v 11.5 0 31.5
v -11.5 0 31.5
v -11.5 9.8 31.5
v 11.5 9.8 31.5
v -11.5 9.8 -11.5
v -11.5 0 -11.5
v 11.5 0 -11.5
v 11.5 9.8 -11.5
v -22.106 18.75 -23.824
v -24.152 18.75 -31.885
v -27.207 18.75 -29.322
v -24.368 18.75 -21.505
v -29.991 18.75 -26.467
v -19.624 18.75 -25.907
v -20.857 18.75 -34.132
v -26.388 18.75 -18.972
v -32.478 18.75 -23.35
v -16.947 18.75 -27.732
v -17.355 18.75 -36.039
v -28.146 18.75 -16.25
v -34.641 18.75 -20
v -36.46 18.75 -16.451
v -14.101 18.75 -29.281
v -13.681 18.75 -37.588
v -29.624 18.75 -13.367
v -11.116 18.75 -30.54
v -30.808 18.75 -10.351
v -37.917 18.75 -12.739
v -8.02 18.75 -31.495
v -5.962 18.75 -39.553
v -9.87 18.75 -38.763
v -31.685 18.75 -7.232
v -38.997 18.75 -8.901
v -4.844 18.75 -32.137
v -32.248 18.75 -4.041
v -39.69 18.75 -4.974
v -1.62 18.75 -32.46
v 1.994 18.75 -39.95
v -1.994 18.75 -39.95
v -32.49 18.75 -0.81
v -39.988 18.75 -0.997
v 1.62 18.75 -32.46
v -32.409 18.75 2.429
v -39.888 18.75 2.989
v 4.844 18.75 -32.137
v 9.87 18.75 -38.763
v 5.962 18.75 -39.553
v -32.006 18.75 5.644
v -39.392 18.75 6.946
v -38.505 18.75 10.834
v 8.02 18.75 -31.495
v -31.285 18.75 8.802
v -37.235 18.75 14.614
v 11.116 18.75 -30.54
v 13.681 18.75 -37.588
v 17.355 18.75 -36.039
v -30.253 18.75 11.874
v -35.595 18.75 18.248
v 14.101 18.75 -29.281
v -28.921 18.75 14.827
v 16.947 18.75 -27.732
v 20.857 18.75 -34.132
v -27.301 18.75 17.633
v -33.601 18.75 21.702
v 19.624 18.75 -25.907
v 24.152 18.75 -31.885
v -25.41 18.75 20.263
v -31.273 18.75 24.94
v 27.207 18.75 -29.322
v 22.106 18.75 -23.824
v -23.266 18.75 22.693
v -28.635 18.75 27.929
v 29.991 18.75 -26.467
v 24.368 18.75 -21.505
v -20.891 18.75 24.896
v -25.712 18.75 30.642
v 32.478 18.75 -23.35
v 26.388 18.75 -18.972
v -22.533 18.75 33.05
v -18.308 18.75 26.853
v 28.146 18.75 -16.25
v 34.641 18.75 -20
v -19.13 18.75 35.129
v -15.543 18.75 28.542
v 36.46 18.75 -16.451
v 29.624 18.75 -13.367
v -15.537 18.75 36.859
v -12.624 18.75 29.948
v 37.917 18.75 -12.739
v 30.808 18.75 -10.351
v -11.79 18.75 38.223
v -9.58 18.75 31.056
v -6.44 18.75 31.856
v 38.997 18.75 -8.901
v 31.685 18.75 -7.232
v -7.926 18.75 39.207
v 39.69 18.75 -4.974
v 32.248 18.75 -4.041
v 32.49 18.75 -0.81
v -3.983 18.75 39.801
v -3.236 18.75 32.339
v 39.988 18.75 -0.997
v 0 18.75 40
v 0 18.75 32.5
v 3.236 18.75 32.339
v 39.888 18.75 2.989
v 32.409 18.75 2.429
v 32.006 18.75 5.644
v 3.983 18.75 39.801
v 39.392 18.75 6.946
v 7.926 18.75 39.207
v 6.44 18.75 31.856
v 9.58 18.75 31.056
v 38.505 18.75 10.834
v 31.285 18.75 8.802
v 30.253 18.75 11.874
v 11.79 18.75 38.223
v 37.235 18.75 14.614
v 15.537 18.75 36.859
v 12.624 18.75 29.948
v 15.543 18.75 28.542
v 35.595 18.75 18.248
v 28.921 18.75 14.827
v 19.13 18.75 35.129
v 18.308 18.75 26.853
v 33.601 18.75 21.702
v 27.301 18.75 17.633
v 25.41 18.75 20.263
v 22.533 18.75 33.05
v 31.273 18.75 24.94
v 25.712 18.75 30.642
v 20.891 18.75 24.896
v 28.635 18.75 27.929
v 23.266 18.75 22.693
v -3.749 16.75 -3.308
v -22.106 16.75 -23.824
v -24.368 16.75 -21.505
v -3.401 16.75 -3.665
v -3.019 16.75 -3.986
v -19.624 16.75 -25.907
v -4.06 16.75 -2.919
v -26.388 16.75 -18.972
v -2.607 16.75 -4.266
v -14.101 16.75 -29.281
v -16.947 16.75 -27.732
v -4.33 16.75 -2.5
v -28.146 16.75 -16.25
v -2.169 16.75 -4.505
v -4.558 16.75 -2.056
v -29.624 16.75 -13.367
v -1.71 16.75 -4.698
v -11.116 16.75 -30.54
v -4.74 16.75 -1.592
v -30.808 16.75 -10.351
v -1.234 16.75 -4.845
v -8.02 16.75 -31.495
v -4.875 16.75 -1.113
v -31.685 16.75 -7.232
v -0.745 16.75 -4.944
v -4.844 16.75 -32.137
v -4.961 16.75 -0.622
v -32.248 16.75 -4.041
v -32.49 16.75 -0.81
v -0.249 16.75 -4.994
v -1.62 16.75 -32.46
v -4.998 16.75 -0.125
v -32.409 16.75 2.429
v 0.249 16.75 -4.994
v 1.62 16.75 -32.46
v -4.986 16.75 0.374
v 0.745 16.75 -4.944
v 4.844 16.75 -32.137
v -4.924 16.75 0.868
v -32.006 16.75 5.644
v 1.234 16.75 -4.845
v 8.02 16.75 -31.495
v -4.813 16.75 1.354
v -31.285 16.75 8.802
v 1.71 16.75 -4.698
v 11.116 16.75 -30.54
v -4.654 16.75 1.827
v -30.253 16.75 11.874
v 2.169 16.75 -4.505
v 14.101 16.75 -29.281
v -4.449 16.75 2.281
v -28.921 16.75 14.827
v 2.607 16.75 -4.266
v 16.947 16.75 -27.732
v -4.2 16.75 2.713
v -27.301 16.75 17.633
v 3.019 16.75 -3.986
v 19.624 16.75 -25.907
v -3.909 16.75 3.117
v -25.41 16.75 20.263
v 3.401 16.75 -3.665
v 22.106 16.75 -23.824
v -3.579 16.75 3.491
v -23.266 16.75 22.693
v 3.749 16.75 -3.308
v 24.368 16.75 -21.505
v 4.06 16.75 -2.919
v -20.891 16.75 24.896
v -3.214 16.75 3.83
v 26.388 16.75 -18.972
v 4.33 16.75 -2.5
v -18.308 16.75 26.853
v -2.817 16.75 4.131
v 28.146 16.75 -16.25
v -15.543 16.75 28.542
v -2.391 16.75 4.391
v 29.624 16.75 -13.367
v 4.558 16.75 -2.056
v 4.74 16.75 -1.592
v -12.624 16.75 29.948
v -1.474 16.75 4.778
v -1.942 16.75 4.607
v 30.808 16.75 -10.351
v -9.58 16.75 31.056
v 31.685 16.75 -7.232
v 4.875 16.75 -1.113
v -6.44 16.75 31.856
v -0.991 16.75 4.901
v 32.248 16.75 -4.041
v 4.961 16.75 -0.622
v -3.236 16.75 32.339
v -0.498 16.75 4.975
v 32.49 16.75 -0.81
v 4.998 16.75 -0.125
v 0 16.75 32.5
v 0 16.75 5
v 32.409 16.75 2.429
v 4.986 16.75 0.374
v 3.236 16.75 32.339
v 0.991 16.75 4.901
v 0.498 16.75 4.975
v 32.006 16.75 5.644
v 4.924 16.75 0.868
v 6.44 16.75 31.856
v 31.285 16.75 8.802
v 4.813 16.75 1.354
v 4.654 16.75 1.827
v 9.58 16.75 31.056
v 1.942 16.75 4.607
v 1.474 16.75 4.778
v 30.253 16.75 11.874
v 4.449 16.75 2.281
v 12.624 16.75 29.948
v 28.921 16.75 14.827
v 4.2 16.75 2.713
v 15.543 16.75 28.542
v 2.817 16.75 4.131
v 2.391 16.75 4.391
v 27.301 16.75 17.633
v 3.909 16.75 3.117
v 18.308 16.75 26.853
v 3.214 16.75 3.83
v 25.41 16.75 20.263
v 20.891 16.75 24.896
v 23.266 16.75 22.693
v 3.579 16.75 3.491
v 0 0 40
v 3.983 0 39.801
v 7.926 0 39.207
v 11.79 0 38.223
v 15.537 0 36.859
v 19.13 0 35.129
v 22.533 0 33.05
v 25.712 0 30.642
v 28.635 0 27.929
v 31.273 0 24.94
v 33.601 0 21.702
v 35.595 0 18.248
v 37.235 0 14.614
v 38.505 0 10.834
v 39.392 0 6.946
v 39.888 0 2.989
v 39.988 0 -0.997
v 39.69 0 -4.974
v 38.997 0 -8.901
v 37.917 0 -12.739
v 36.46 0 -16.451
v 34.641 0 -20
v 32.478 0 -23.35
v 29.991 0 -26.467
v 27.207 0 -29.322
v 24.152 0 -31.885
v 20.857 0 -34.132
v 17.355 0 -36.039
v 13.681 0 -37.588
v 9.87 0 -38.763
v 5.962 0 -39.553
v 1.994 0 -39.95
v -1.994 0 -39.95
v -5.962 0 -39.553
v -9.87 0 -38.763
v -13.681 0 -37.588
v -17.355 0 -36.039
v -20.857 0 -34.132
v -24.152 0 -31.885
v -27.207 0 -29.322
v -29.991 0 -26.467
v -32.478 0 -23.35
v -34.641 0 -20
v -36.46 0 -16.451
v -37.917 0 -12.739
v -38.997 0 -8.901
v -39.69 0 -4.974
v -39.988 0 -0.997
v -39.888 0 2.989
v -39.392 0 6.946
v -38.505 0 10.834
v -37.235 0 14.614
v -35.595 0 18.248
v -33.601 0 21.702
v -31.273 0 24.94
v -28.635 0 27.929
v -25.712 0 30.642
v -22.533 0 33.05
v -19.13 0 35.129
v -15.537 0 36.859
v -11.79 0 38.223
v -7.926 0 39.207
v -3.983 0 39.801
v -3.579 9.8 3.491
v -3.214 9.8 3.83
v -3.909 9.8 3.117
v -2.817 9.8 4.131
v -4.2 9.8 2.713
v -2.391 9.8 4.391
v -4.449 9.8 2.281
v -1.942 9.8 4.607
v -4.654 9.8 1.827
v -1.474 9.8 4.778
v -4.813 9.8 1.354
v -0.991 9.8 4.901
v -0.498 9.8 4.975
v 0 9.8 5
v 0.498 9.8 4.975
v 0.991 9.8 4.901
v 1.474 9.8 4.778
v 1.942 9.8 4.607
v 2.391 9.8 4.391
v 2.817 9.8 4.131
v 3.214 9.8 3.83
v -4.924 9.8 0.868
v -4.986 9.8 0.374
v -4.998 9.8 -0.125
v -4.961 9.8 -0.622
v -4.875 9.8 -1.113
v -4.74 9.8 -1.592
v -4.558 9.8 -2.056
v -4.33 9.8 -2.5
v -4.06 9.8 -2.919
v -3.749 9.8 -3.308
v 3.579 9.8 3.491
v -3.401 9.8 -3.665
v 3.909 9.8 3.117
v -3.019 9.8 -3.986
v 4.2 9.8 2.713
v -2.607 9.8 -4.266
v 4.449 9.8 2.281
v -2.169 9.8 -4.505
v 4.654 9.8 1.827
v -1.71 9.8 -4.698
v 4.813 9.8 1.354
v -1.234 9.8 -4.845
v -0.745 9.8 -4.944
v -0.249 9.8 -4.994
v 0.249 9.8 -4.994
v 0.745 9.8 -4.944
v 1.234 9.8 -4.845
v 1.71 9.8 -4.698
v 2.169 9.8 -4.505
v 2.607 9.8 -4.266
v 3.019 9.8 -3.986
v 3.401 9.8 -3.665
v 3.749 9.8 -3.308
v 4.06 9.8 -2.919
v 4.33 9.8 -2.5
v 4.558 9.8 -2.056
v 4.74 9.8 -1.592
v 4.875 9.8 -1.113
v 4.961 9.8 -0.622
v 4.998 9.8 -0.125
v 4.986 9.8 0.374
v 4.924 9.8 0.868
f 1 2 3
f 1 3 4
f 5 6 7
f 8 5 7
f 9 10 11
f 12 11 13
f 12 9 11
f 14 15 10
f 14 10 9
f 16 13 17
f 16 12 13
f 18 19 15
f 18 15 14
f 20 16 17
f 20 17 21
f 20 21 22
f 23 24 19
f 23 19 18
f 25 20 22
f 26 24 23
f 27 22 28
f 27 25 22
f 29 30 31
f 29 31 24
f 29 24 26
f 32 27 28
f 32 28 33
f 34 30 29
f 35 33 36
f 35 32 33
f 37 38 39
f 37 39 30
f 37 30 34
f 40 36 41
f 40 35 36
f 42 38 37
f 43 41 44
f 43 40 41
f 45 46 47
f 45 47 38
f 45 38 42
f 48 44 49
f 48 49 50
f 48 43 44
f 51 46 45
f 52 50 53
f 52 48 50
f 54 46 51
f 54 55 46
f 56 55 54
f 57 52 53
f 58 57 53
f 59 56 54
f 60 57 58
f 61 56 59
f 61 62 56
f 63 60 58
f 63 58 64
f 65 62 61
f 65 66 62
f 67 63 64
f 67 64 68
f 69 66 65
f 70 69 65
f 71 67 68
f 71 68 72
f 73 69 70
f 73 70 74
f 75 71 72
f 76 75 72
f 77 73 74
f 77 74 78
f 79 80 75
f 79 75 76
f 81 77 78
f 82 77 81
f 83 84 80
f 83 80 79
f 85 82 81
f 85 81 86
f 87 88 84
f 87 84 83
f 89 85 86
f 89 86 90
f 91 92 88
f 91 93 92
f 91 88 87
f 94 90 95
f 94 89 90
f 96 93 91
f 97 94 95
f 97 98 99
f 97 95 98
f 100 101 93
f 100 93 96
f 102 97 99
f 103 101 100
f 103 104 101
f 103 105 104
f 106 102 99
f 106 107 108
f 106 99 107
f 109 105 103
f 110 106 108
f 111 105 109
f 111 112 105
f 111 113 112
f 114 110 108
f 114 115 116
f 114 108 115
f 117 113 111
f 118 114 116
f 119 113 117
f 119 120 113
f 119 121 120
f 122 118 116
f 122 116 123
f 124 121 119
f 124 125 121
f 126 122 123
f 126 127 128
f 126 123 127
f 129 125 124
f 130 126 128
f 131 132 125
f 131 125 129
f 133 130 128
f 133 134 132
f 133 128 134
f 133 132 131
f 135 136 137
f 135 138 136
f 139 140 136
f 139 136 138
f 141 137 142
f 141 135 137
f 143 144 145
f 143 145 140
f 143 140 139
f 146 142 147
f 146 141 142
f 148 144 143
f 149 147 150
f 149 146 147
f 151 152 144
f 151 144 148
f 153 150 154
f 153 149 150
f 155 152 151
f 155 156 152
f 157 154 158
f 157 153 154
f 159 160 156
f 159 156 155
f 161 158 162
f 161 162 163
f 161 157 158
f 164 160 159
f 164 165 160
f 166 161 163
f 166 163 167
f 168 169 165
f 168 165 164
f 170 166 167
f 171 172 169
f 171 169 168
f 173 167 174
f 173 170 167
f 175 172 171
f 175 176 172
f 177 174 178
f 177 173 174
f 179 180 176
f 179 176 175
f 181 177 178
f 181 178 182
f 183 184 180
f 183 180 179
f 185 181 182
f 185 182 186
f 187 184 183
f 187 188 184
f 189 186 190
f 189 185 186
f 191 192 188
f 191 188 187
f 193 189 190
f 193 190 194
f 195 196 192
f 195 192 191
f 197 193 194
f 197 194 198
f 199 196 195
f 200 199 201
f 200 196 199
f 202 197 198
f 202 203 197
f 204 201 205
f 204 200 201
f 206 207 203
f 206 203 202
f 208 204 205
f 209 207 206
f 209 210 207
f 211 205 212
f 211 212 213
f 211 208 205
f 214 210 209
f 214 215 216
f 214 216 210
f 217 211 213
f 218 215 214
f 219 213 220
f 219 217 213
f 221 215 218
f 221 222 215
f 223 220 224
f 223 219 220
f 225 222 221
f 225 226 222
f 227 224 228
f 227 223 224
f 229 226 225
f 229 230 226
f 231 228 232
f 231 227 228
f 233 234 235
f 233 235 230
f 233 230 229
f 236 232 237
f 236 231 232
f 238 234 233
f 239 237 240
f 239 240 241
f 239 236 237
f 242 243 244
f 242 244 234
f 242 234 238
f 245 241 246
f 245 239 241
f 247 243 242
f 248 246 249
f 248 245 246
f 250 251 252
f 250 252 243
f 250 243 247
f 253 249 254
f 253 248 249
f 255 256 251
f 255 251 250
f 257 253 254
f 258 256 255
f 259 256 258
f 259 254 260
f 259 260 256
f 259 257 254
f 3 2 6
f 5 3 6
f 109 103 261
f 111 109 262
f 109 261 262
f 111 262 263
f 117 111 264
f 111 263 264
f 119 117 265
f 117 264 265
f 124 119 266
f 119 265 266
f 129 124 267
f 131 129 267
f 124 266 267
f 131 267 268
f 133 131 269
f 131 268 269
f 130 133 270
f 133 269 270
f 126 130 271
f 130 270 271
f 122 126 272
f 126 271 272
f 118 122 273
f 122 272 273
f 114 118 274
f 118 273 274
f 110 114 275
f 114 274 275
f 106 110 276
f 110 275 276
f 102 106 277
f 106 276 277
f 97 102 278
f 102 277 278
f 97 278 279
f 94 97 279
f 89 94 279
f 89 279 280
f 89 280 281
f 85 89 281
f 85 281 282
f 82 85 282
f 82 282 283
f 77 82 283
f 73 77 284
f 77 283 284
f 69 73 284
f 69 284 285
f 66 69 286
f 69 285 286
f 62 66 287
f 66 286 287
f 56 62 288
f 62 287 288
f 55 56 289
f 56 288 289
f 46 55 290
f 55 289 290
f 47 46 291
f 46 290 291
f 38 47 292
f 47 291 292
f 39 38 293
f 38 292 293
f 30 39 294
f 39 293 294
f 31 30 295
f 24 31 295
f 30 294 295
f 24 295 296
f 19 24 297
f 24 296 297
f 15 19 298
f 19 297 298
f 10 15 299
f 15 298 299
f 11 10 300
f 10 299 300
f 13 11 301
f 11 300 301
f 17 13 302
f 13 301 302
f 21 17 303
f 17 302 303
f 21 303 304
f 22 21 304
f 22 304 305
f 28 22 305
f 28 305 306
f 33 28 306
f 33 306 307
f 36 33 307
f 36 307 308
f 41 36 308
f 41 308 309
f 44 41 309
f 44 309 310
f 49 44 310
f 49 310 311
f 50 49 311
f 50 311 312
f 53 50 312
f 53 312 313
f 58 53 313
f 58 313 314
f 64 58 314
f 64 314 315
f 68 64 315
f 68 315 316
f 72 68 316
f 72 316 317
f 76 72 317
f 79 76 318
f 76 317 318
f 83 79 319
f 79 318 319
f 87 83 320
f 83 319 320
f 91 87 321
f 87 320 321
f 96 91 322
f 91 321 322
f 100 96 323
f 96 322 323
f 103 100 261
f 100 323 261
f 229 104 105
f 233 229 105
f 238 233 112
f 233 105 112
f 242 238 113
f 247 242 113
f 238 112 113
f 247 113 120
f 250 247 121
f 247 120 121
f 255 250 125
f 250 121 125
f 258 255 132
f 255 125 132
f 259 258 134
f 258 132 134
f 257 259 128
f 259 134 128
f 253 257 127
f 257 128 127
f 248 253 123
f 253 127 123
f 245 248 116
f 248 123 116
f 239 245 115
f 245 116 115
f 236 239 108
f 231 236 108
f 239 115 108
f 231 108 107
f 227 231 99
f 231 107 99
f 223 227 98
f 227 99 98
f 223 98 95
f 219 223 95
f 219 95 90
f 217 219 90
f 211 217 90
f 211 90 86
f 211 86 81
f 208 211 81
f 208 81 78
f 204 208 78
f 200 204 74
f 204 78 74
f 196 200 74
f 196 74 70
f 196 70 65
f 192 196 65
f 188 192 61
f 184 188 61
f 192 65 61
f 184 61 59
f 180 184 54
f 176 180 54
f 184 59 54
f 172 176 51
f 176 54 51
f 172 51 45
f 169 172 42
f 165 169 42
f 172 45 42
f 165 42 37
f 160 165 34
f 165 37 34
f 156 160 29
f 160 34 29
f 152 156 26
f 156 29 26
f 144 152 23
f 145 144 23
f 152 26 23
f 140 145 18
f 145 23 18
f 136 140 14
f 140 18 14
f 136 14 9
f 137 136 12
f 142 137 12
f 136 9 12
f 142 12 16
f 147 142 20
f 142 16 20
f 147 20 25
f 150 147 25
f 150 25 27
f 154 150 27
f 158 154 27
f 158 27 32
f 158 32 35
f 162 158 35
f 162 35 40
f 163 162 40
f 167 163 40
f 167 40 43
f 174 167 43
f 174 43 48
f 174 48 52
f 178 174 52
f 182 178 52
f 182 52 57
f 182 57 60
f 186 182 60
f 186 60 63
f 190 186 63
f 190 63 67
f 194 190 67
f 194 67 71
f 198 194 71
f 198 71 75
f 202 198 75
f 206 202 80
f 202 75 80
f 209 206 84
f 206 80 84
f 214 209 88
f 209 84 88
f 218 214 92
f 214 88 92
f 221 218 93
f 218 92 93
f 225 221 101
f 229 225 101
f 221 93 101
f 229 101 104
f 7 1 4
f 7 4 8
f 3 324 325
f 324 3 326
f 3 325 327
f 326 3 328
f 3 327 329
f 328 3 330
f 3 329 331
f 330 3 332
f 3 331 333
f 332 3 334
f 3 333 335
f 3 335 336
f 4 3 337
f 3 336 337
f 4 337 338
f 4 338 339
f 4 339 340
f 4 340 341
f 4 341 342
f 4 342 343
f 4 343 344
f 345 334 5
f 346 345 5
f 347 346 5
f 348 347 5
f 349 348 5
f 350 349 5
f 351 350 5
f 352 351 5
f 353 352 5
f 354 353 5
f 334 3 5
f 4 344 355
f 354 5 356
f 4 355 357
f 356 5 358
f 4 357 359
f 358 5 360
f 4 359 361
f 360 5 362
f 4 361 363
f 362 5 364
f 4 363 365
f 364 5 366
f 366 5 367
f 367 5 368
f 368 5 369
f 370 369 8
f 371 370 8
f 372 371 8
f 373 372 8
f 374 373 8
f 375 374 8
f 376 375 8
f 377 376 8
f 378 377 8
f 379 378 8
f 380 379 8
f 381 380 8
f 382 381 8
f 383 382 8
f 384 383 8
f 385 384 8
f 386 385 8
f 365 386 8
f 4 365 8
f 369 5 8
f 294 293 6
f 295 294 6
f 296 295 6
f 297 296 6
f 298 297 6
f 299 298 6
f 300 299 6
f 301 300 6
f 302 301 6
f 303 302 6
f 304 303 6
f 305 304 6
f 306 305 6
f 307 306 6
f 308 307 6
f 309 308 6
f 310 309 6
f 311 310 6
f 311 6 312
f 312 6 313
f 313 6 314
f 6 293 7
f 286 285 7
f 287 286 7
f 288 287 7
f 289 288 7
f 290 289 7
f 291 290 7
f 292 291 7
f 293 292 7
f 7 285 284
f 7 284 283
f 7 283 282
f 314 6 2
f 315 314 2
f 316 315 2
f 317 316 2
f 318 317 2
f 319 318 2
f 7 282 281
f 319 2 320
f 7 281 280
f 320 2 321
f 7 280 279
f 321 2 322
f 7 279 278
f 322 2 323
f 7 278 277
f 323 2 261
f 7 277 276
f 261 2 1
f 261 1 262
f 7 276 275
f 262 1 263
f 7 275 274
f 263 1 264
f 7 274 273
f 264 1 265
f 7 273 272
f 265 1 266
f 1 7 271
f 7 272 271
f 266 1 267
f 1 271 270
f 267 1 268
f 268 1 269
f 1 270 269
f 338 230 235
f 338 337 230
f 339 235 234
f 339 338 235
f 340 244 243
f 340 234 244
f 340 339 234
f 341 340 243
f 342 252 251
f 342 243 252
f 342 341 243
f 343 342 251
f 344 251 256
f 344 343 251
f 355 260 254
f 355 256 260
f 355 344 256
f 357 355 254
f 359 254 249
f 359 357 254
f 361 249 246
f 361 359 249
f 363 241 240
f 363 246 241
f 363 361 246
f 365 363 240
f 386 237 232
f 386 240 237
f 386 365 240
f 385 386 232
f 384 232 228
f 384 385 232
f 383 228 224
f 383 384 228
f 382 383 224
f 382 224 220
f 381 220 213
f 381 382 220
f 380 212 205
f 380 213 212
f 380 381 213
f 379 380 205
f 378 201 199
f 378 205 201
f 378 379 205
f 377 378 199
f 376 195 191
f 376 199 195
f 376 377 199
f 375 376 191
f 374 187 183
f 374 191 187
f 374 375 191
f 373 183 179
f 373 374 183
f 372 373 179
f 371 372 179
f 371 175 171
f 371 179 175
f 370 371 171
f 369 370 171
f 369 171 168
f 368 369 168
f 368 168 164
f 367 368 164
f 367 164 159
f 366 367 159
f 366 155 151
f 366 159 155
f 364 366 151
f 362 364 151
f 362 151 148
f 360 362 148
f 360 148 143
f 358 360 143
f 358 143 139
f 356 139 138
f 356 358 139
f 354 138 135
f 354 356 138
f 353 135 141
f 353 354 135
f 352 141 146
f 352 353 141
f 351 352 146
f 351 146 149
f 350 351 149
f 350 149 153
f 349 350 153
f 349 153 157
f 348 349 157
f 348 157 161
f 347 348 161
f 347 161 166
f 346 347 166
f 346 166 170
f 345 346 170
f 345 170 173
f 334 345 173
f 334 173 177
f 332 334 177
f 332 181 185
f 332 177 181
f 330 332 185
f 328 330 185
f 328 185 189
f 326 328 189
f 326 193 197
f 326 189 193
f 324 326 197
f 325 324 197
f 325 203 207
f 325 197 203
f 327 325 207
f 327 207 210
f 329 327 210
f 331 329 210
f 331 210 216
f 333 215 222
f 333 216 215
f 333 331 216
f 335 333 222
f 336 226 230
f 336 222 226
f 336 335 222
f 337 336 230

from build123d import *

# Parameters (mm, degrees)
SKETCH1_R               = 40
BOSS_EXTRUDE1_DEPTH     = 18.75
SKETCH1_3_W             = 23
SKETCH1_3_H             = 43
CUT_EXTRUDE1_DEPTH      = 9.8
CUT_EXTRUDE2_DEPTH      = 60.594987205
CUT_EXTRUDE2_DEPTH_BACK = 60.594987205
SKETCH1_4_R             = 5
CUT_EXTRUDE3_START      = 18.75
SKETCH1_5_R             = 32.5
CUT_EXTRUDE3_DEPTH      = 2


with BuildPart() as part:
    # Sketch1 → Boss-Extrude1 (new body)
    with BuildSketch(Plane(origin=(0, 0, 0), x_dir=(1, 0, 0), z_dir=(0, 1, 0))):
        with Locations(Location((0, 0, 0), (0, 0, 270))):
            Circle(SKETCH1_R)
    extrude(amount=BOSS_EXTRUDE1_DEPTH)

    # Sketch1<3> → Cut-Extrude1 (cut)
    with BuildSketch(Plane(origin=(0, 0, 0), x_dir=(1, 0, 0), z_dir=(0, 1, 0))):
        with Locations((0, -10)):
            Rectangle(SKETCH1_3_W, SKETCH1_3_H)
    extrude(amount=CUT_EXTRUDE1_DEPTH, mode=Mode.SUBTRACT)

    # Sketch1<4> → Cut-Extrude2 (cut, two sides: drawn at the far end of the back side and taken through both)
    with BuildSketch(Plane(origin=(0, 0, 0), x_dir=(1, 0, 0), z_dir=(0, 1, 0)).offset(-CUT_EXTRUDE2_DEPTH_BACK)):
        with Locations(Location((0, 0, 0), (0, 0, 270))):
            Circle(SKETCH1_4_R)
    extrude(amount=CUT_EXTRUDE2_DEPTH + CUT_EXTRUDE2_DEPTH_BACK, mode=Mode.SUBTRACT)

    # Sketch1<5> → Cut-Extrude3 (cut)
    with BuildSketch(Plane(origin=(0, 0, 0), x_dir=(1, 0, 0), z_dir=(0, 1, 0)).offset(CUT_EXTRUDE3_START)):
        with Locations(Location((0, 0, 0), (0, 0, 270))):
            Circle(SKETCH1_5_R)
    extrude(amount=-CUT_EXTRUDE3_DEPTH, mode=Mode.SUBTRACT)


solid = part.part
